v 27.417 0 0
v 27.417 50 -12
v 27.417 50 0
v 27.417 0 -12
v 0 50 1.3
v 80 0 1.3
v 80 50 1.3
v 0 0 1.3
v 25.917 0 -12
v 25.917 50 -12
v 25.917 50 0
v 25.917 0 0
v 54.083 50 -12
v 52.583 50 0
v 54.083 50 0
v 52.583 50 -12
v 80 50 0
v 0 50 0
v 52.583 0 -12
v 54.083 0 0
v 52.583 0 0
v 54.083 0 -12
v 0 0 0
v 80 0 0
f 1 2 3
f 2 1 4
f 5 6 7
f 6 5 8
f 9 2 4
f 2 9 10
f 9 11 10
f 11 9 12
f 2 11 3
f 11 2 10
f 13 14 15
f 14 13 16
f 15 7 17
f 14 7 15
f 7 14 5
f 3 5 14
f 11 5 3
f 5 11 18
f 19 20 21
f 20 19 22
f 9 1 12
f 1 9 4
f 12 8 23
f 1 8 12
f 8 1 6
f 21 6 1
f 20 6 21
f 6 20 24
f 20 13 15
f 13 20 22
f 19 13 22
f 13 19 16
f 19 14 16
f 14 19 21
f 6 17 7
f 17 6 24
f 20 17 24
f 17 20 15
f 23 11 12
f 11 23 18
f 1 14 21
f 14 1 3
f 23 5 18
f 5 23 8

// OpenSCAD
$fn = 32;

// ----------------------------------------------------------------------
// Ribbed panel: 1.3 mm panel
// ----------------------------------------------------------------------

// --- parameters (mm) ---
panel_l = 80;             // panel length, X
panel_w = 50;             // panel width, Y
panel_t = 1.3;            // panel thickness, Z
rib_t = 1.5;              // rib thickness
rib_h = 12;               // rib height below the panel
ribs = 2;                 // number of ribs

total_h = panel_t + rib_h;  // overall height

union() {
  cube([panel_l, panel_w, panel_t]);
  for (i = [1 : ribs])
    translate([i * panel_l / (ribs + 1) - rib_t / 2, 0, -rib_h])
      cube([rib_t, panel_w, rib_h + panel_t]);
}
